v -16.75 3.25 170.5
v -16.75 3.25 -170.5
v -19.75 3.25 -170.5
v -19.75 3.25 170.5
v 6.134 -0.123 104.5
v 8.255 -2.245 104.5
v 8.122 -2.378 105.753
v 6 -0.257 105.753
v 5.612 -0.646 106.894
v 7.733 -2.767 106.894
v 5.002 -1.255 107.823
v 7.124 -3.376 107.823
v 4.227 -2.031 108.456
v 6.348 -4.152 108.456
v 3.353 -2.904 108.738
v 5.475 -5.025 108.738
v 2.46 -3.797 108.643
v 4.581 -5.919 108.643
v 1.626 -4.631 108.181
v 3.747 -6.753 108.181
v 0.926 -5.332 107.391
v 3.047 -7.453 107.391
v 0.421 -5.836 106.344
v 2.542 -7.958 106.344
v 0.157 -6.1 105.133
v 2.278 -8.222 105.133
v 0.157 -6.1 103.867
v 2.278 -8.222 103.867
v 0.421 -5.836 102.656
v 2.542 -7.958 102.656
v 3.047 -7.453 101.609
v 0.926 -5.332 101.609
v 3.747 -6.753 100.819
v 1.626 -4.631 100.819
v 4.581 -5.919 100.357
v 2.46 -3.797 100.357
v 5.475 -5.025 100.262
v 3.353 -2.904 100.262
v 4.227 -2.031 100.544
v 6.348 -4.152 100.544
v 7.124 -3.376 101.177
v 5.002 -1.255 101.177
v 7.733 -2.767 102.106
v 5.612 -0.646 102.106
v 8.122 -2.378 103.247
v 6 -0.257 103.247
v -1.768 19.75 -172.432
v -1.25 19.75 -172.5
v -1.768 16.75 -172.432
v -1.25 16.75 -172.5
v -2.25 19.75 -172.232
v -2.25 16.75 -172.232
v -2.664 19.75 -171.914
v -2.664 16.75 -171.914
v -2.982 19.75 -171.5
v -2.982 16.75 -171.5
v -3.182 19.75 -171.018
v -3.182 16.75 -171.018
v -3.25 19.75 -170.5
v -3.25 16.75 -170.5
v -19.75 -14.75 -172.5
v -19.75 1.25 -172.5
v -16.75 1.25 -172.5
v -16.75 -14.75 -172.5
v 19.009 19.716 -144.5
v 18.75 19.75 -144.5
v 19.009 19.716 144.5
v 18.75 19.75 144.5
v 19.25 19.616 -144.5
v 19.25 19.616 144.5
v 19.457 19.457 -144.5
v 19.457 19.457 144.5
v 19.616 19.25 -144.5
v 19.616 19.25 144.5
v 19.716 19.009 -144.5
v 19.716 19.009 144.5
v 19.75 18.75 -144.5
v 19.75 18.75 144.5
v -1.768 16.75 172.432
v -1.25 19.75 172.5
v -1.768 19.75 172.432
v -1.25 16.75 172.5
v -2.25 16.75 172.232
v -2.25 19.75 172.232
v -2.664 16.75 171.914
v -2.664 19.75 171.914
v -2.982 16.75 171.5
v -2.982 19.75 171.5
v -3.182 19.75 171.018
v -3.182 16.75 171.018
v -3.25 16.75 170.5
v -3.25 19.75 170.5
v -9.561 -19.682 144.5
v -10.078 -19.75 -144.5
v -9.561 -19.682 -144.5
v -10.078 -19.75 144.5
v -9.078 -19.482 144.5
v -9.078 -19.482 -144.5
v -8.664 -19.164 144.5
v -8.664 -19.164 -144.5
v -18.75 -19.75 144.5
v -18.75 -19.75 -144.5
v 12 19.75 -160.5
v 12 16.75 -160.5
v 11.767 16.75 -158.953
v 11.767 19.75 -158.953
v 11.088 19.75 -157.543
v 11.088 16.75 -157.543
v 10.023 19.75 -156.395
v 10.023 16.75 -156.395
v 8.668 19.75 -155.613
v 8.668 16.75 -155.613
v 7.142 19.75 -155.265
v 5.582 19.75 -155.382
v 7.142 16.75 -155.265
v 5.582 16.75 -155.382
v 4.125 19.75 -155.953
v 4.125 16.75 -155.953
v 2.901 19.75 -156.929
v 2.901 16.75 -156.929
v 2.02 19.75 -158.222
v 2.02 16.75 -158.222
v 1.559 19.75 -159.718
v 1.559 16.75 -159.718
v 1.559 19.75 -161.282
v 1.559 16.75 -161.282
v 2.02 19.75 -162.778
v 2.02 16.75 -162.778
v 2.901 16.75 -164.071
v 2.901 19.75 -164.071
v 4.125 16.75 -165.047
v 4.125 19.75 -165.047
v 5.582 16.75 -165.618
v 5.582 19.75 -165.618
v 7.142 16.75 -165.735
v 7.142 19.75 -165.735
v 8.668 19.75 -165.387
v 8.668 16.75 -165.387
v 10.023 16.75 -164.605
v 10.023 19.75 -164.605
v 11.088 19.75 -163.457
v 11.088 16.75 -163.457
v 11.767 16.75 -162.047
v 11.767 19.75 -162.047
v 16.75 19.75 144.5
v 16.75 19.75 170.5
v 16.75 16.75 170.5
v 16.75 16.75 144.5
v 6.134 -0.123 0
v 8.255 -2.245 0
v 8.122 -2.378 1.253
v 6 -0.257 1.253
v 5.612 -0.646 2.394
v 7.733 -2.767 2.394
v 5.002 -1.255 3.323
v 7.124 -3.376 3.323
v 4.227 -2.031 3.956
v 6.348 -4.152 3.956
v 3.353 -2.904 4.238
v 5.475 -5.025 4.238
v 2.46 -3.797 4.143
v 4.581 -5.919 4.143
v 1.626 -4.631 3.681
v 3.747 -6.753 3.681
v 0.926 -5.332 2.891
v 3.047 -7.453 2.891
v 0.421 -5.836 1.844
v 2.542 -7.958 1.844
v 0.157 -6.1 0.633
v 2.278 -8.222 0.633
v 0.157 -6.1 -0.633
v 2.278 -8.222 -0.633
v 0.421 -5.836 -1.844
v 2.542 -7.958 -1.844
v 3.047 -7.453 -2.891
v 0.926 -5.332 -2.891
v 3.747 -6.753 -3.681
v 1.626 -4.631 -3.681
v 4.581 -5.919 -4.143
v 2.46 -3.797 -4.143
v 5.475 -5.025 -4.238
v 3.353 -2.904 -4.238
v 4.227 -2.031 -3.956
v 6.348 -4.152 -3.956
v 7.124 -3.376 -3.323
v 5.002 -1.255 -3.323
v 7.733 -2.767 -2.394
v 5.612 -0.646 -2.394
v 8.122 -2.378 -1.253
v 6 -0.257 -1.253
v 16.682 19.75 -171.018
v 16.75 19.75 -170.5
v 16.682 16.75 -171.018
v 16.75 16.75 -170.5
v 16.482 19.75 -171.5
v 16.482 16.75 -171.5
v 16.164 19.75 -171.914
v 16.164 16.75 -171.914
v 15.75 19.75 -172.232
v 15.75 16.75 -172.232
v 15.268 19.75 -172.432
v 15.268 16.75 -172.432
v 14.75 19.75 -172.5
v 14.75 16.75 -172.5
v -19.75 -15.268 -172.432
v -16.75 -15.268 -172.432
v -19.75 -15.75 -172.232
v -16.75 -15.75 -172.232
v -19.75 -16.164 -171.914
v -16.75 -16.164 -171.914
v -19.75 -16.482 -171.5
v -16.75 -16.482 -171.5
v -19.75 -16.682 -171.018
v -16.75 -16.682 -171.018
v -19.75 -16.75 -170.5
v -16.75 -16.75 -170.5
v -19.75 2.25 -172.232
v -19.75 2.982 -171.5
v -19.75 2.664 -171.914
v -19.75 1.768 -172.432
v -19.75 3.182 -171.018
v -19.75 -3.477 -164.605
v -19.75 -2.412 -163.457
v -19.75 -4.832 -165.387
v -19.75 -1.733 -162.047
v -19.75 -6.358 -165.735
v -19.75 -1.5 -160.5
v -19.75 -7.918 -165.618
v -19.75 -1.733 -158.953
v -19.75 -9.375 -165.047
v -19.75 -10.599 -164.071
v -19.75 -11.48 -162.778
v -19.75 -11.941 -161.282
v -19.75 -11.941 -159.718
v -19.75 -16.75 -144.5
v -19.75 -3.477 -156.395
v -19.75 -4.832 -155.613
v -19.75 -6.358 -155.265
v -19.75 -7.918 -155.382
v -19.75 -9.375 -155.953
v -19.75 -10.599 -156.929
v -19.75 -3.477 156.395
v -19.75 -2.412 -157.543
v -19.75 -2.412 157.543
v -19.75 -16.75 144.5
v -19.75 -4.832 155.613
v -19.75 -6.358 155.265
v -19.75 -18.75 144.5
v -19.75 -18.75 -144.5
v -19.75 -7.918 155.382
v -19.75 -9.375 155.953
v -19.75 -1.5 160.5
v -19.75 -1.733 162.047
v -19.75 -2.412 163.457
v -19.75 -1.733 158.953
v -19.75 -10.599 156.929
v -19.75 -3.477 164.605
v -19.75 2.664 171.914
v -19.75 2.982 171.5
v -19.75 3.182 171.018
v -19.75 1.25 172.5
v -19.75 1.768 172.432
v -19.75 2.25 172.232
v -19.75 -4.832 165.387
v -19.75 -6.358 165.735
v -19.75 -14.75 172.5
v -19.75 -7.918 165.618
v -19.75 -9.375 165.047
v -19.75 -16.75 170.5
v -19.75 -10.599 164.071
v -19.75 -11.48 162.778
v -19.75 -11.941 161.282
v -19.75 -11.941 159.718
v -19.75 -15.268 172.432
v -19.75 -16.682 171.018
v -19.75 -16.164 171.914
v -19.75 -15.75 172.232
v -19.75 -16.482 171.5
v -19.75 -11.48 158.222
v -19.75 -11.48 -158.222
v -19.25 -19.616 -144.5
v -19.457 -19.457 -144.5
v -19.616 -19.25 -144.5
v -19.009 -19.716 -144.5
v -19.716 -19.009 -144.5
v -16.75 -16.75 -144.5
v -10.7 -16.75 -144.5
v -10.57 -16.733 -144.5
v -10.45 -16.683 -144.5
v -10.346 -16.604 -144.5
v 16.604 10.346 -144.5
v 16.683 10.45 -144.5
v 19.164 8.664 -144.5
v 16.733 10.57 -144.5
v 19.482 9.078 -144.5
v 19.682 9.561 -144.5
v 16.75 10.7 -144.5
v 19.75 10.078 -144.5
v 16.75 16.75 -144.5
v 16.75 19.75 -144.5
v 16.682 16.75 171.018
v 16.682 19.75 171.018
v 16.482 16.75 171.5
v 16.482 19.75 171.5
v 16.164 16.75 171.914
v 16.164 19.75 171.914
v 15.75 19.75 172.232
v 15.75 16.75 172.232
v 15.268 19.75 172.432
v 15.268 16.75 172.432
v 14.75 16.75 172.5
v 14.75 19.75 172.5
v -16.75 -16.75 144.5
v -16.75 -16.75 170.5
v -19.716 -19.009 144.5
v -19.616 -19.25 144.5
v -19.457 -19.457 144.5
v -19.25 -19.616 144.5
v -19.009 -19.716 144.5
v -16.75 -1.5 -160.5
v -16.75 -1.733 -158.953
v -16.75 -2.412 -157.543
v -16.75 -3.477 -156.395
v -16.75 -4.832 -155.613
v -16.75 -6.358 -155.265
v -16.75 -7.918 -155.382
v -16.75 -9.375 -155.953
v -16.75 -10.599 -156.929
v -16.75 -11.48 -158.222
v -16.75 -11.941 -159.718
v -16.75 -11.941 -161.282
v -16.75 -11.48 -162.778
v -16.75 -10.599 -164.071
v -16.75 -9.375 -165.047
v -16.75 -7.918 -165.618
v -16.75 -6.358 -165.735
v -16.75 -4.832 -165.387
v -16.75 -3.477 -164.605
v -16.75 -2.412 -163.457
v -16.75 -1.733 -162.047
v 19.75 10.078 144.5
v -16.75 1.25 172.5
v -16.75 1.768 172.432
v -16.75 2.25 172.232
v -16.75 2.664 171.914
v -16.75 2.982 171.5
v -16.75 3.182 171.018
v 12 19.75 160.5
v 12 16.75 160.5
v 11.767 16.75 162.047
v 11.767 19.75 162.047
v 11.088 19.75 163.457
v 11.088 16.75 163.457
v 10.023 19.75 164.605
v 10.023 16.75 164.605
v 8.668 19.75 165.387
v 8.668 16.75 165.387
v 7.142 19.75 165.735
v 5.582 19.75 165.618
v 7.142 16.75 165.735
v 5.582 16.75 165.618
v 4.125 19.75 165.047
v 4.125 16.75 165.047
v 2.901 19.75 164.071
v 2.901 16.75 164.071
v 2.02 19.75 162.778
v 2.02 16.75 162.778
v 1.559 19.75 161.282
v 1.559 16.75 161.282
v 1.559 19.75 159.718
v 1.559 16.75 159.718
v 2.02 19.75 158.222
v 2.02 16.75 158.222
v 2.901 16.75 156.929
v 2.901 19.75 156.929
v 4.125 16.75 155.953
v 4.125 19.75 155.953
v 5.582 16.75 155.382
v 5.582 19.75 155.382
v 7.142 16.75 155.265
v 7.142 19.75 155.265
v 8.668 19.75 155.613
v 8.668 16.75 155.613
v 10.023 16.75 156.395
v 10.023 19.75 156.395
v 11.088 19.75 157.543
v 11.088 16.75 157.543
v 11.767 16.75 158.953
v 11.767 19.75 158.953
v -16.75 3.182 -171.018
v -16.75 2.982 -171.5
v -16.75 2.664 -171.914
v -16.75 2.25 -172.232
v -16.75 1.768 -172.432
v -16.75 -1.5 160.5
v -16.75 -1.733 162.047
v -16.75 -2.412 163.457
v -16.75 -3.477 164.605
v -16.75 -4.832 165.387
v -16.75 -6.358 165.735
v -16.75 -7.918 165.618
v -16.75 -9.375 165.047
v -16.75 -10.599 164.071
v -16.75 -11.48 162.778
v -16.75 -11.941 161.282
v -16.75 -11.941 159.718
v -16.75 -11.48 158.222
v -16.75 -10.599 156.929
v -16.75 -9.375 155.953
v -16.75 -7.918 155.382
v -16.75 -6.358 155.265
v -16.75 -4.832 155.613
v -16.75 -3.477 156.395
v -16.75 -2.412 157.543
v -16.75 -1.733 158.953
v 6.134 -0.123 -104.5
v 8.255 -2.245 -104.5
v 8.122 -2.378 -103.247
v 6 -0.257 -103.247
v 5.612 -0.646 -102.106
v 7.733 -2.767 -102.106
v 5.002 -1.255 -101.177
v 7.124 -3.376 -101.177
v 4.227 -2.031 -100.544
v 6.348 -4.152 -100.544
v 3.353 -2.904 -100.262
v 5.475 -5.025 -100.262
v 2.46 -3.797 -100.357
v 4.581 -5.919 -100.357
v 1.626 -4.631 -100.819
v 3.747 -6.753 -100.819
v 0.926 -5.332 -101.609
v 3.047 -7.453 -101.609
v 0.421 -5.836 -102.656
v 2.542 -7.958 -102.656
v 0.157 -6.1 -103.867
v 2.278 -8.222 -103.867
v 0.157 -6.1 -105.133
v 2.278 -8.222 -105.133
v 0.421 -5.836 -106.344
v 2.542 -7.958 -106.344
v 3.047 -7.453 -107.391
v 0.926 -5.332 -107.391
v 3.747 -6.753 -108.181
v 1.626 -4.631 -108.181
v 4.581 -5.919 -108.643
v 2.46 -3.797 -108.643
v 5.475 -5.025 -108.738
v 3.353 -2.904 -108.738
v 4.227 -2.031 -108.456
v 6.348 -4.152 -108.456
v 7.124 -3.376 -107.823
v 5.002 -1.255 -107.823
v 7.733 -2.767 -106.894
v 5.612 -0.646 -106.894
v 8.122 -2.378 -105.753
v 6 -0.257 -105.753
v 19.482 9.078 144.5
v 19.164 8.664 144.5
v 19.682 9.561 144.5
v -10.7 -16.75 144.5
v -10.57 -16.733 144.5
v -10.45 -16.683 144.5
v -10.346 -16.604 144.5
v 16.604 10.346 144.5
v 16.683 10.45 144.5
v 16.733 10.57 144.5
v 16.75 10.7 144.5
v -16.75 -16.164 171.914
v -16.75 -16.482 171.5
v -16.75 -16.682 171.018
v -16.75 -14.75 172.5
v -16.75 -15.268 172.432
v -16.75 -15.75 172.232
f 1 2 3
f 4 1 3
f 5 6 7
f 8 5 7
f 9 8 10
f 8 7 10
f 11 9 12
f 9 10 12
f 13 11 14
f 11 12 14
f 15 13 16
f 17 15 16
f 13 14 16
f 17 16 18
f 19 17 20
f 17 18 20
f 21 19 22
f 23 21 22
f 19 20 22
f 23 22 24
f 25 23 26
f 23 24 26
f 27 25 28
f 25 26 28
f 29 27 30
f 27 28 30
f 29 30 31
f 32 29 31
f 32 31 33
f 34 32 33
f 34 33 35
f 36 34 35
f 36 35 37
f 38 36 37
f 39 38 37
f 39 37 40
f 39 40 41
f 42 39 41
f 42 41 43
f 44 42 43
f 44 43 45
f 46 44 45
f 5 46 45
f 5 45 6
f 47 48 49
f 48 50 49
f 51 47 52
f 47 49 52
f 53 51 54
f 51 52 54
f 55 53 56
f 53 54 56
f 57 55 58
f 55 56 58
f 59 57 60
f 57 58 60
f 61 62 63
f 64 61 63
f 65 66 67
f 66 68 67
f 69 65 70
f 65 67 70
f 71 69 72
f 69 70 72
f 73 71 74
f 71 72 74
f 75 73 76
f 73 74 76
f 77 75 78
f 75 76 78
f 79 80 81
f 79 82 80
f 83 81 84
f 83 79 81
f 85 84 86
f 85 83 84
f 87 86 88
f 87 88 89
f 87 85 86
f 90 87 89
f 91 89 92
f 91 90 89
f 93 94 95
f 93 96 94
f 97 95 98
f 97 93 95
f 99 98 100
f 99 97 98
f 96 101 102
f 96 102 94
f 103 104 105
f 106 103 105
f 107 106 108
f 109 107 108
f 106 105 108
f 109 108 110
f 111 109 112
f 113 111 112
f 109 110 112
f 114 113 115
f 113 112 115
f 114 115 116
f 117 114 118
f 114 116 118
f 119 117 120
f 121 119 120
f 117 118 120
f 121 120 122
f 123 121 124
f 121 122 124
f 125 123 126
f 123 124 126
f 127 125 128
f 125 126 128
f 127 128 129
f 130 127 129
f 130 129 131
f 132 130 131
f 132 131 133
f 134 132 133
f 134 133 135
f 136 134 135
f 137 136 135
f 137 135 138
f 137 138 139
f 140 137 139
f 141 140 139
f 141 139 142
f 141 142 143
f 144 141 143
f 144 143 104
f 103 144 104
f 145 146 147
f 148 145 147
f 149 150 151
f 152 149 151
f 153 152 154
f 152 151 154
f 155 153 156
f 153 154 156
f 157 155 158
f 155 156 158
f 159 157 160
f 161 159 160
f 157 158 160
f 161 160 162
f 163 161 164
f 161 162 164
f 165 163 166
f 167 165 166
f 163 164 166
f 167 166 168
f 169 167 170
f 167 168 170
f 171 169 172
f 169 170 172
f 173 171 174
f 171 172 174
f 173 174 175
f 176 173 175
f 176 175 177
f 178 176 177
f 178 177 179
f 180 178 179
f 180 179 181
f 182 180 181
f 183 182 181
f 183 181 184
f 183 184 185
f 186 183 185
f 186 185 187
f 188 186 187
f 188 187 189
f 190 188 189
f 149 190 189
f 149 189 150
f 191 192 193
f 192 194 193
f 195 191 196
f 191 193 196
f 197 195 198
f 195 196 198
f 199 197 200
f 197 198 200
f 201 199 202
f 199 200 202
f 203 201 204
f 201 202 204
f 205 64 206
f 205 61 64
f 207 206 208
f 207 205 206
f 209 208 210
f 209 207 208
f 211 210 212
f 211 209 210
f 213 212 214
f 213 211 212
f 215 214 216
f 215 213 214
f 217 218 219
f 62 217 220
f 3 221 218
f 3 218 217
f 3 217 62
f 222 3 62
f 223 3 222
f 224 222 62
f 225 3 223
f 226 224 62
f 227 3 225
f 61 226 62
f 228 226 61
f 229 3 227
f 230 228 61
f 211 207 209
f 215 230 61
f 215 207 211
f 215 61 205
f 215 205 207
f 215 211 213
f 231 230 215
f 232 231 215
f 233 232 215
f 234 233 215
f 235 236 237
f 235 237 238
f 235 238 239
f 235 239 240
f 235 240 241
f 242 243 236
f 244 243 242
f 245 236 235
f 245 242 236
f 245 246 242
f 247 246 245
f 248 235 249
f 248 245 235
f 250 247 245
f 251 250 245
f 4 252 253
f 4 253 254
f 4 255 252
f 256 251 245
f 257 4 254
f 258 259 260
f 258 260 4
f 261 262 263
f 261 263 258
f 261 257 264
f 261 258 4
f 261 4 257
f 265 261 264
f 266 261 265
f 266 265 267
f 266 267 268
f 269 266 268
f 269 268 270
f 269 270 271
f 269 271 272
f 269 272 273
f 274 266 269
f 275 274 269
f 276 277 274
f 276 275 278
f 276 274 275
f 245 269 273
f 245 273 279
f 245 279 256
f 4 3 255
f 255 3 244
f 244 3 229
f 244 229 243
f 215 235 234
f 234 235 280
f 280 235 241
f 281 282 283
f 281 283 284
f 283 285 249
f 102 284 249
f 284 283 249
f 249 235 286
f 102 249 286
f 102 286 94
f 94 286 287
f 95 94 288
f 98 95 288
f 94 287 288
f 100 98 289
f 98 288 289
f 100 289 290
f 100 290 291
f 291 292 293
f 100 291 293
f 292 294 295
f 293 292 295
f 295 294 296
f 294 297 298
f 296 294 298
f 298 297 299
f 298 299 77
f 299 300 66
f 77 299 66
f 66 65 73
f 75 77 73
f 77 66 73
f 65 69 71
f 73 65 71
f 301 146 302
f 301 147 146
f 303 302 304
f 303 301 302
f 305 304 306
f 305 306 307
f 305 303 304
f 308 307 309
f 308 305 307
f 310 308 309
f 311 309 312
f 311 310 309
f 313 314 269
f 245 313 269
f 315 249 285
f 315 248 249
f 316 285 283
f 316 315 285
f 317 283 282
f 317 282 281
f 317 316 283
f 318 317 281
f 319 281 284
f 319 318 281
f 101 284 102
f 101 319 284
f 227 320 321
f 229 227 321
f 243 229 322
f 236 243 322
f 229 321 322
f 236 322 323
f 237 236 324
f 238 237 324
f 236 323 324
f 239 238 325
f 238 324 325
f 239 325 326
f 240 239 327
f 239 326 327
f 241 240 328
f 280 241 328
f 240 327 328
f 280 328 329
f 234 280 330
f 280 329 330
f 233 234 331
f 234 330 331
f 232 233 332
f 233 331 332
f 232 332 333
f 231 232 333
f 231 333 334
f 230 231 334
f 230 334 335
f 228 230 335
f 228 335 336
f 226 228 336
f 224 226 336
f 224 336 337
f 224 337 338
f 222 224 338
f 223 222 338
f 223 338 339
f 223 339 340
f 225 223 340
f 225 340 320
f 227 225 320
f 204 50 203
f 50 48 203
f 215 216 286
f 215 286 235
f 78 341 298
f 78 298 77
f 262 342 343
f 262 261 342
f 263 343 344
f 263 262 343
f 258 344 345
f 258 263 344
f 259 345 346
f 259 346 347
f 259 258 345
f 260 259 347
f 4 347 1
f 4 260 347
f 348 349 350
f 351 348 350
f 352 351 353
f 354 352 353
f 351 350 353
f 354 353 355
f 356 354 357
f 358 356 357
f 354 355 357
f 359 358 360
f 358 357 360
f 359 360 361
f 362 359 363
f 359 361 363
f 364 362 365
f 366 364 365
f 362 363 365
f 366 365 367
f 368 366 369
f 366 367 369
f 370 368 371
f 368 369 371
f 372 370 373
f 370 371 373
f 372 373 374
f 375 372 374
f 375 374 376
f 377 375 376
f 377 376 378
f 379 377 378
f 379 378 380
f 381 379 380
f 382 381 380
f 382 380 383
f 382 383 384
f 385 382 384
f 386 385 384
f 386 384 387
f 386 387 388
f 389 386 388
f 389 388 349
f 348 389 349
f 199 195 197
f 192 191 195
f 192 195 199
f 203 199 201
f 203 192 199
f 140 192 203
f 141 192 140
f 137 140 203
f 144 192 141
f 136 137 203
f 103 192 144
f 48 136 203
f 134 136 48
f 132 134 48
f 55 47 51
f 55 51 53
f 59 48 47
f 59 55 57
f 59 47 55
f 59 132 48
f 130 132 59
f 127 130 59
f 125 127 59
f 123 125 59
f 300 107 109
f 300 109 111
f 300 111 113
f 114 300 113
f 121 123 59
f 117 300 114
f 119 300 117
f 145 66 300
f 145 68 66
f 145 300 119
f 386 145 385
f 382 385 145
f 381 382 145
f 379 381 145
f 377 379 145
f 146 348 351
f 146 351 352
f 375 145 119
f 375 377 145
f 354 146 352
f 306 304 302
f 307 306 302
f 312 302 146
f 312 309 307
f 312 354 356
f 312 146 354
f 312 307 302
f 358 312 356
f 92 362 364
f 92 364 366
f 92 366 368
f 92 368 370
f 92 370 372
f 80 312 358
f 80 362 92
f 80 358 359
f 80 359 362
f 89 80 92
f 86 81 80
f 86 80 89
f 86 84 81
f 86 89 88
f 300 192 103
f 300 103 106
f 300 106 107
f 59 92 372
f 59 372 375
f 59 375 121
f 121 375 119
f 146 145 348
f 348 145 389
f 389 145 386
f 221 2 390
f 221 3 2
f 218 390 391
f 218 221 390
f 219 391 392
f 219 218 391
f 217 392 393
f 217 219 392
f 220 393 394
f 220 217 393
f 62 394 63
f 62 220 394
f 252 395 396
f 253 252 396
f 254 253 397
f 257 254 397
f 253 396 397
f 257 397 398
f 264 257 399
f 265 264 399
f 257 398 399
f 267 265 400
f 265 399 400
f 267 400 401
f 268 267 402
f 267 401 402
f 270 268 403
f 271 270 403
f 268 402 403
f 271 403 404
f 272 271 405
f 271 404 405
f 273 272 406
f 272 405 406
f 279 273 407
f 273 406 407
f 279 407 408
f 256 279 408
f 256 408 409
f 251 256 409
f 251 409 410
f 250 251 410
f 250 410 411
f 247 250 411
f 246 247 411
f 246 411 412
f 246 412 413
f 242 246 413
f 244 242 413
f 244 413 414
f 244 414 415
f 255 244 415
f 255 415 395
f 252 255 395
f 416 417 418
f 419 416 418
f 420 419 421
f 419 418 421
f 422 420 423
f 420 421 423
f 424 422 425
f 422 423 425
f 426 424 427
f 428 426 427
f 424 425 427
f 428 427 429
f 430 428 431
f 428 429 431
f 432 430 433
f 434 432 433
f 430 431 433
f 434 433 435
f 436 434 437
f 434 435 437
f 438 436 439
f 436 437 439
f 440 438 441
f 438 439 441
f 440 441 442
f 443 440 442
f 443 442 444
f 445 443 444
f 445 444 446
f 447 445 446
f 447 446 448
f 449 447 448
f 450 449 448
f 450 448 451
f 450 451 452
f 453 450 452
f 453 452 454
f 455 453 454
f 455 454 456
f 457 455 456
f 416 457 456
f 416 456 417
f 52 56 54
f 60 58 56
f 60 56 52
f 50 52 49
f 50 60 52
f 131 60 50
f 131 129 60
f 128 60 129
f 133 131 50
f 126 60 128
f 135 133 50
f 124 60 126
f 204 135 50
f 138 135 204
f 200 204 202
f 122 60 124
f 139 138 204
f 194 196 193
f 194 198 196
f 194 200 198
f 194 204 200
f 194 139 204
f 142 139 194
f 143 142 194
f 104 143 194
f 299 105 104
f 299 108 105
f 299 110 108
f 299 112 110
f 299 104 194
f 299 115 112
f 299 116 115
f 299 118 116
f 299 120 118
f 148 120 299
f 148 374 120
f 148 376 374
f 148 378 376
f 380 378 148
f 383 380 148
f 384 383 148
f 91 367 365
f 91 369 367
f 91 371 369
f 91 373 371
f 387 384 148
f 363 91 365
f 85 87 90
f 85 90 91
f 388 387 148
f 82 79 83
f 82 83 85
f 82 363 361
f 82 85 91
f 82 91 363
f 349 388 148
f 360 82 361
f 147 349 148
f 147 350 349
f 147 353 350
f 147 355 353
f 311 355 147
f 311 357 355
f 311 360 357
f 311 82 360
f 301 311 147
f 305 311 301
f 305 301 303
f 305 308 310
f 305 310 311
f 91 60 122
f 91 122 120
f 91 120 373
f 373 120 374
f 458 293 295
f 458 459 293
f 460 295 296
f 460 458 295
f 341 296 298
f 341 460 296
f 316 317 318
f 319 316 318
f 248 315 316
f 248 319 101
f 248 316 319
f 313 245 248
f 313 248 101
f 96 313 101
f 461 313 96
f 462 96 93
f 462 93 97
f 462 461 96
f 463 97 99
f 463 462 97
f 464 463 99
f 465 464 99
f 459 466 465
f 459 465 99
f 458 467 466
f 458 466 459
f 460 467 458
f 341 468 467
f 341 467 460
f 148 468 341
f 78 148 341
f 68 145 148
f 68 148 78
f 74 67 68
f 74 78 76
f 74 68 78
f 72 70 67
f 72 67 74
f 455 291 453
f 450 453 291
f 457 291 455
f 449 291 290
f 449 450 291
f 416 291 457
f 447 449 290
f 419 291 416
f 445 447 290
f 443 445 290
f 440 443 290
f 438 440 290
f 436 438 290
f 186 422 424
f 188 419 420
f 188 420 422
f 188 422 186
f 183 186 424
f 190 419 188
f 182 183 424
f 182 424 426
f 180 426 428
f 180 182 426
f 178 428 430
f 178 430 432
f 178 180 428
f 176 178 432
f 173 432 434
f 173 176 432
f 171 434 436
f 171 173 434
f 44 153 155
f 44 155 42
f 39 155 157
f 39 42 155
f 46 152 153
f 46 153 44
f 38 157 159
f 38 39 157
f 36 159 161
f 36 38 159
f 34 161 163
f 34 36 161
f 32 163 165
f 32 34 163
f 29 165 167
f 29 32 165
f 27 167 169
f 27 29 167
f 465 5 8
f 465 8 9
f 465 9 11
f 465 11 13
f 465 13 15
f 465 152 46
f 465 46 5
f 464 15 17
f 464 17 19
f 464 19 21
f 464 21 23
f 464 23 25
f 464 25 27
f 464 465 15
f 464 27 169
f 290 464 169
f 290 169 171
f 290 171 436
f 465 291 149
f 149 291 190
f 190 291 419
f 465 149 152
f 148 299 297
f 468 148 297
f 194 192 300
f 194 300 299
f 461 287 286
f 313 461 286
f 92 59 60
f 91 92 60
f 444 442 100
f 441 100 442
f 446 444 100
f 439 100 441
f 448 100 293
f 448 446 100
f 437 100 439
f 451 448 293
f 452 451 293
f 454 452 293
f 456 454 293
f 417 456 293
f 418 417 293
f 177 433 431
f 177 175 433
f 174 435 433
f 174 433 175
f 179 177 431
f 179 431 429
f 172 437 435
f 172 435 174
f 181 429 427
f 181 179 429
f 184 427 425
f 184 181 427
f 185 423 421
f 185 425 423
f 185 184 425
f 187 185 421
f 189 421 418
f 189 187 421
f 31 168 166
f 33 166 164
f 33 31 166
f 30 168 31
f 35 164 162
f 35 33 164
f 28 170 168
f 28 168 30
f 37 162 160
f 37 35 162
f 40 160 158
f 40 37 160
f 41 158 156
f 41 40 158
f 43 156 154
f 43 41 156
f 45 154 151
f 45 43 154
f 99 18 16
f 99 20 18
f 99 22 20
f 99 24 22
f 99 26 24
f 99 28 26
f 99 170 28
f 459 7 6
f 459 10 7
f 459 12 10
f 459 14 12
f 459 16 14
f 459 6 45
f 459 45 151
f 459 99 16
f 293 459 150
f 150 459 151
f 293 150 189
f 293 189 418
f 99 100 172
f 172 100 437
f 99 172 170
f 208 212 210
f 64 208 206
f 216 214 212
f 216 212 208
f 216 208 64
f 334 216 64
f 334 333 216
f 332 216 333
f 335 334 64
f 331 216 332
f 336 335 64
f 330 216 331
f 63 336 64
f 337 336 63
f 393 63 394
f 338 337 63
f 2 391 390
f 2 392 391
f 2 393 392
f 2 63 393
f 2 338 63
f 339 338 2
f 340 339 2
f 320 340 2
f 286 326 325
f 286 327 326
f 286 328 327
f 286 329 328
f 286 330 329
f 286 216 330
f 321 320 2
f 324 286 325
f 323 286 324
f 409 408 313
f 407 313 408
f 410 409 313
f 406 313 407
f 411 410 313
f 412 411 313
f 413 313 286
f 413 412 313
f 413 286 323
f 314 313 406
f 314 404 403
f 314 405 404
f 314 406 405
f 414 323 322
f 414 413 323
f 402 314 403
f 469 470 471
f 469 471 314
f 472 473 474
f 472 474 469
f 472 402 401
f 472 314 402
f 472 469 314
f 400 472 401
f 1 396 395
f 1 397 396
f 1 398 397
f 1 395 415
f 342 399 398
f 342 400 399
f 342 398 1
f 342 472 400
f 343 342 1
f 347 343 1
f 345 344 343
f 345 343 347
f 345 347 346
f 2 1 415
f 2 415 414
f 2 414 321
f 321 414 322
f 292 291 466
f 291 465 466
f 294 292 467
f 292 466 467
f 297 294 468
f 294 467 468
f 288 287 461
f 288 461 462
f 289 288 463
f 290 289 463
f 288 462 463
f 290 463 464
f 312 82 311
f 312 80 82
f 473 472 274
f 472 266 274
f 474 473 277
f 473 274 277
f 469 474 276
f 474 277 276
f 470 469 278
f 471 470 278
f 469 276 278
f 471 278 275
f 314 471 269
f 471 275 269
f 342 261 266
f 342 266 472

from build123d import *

# Parameters (mm, degrees)
F1_DEPTH = 172.5
F3_DEPTH = 28
F4_R     = 4.25
F5_DEPTH = 25
F6_R     = 5.25
F7_DEPTH = 25
F8_R     = 5.25
F9_DEPTH = 25
F10_R    = 2
F11_R    = 0.5
F12_R    = 1


# Not quite as in the source:
# - a pattern or mirror of a feature is missing from the dataset's text; its kind, count and spacing are read off the source's solid


with BuildPart() as f1:
    # F0 (on Top) → F1 (new body, symmetric)
    with BuildSketch(Plane.XY):
        Polygon((-19.75, 3.25), (-19.75, -19.75), (-9.25, -19.75), (19.75, 9.25), (19.75, 19.75), (-3.25, 19.75), (-3.25, 16.75), (16.75, 16.75), (16.75, 10.4926406871), (-10.4926406871, -16.75), (-16.75, -16.75), (-16.75, 3.25), align=None)
    extrude(amount=F1_DEPTH, both=True)

    # F2 (on face) → F3 (cut)
    with BuildSketch(Plane.XY.offset(172.5)):
        Polygon((-10.4926406871, -16.75), (-16.75, -16.75), (-19.75, -16.75), (-19.75, -19.75), (-9.25, -19.75), (19.75, 9.25), (19.75, 19.75), (16.75, 19.75), (16.75, 16.75), (16.75, 10.4926406871), align=None)
    f3 = extrude(amount=-F3_DEPTH, mode=Mode.SUBTRACT)

    # F3_copies: F3 across plane
    add(f3.mirror(Plane(origin=(0, 0, 0), x_dir=(-1, 0, 0), z_dir=(0, 0, -1))), mode=Mode.SUBTRACT)

    # F4 (on face) → F5 (cut)
    with BuildSketch(Plane(origin=(5.25, -5.25, 0), x_dir=(0.7071067812, 0.7071067812, 0), z_dir=(0.7071067812, -0.7071067812, 0))):
        with Locations((0, 104.5)):
            Circle(F4_R)
        with Locations((0, -104.5)):
            Circle(F4_R)
        Circle(F4_R)
    extrude(amount=-F5_DEPTH, mode=Mode.SUBTRACT)

    # F6 (on face) → F7 (cut)
    with BuildSketch(Plane.YZ.offset(-16.75)):
        with Locations((-6.75, 160.5)):
            Circle(F6_R)
        with Locations((-6.75, -160.5)):
            Circle(F6_R)
    extrude(amount=-F7_DEPTH, mode=Mode.SUBTRACT)

    # F8 (on face) → F9 (cut)
    with BuildSketch(Plane.XZ.offset(-16.75)):
        with Locations((6.75, 160.5)):
            Circle(F8_R)
        with Locations((6.75, -160.5)):
            Circle(F8_R)
    extrude(amount=-F9_DEPTH, mode=Mode.SUBTRACT)

    # F10
    f10_edges = [f1.edges().sort_by_distance(p)[0] for p in [
        (-9.25, -19.75, 0),
        (19.75, 9.25, 0),
        (16.75, 18.25, 172.5),
        (-3.25, 18.25, 172.5),
        (-18.25, 3.25, 172.5),
        (-18.25, -16.75, 172.5),
        (-18.25, 3.25, -172.5),
        (-3.25, 18.25, -172.5),
        (-18.25, -16.75, -172.5),
        (16.75, 18.25, -172.5),
    ]]
    fillet(f10_edges, radius=F10_R)

    # F11
    f11_edges = [f1.edges().sort_by_distance(p)[0] for p in [
        (-10.492641, -16.75, 0),
        (16.75, 10.492641, 0),
    ]]
    fillet(f11_edges, radius=F11_R)

    # F12
    f12_edges = [f1.edges().sort_by_distance(p)[0] for p in [
        (-19.75, -19.75, 0),
        (19.75, 19.75, 0),
    ]]
    fillet(f12_edges, radius=F12_R)


solid = f1.part
